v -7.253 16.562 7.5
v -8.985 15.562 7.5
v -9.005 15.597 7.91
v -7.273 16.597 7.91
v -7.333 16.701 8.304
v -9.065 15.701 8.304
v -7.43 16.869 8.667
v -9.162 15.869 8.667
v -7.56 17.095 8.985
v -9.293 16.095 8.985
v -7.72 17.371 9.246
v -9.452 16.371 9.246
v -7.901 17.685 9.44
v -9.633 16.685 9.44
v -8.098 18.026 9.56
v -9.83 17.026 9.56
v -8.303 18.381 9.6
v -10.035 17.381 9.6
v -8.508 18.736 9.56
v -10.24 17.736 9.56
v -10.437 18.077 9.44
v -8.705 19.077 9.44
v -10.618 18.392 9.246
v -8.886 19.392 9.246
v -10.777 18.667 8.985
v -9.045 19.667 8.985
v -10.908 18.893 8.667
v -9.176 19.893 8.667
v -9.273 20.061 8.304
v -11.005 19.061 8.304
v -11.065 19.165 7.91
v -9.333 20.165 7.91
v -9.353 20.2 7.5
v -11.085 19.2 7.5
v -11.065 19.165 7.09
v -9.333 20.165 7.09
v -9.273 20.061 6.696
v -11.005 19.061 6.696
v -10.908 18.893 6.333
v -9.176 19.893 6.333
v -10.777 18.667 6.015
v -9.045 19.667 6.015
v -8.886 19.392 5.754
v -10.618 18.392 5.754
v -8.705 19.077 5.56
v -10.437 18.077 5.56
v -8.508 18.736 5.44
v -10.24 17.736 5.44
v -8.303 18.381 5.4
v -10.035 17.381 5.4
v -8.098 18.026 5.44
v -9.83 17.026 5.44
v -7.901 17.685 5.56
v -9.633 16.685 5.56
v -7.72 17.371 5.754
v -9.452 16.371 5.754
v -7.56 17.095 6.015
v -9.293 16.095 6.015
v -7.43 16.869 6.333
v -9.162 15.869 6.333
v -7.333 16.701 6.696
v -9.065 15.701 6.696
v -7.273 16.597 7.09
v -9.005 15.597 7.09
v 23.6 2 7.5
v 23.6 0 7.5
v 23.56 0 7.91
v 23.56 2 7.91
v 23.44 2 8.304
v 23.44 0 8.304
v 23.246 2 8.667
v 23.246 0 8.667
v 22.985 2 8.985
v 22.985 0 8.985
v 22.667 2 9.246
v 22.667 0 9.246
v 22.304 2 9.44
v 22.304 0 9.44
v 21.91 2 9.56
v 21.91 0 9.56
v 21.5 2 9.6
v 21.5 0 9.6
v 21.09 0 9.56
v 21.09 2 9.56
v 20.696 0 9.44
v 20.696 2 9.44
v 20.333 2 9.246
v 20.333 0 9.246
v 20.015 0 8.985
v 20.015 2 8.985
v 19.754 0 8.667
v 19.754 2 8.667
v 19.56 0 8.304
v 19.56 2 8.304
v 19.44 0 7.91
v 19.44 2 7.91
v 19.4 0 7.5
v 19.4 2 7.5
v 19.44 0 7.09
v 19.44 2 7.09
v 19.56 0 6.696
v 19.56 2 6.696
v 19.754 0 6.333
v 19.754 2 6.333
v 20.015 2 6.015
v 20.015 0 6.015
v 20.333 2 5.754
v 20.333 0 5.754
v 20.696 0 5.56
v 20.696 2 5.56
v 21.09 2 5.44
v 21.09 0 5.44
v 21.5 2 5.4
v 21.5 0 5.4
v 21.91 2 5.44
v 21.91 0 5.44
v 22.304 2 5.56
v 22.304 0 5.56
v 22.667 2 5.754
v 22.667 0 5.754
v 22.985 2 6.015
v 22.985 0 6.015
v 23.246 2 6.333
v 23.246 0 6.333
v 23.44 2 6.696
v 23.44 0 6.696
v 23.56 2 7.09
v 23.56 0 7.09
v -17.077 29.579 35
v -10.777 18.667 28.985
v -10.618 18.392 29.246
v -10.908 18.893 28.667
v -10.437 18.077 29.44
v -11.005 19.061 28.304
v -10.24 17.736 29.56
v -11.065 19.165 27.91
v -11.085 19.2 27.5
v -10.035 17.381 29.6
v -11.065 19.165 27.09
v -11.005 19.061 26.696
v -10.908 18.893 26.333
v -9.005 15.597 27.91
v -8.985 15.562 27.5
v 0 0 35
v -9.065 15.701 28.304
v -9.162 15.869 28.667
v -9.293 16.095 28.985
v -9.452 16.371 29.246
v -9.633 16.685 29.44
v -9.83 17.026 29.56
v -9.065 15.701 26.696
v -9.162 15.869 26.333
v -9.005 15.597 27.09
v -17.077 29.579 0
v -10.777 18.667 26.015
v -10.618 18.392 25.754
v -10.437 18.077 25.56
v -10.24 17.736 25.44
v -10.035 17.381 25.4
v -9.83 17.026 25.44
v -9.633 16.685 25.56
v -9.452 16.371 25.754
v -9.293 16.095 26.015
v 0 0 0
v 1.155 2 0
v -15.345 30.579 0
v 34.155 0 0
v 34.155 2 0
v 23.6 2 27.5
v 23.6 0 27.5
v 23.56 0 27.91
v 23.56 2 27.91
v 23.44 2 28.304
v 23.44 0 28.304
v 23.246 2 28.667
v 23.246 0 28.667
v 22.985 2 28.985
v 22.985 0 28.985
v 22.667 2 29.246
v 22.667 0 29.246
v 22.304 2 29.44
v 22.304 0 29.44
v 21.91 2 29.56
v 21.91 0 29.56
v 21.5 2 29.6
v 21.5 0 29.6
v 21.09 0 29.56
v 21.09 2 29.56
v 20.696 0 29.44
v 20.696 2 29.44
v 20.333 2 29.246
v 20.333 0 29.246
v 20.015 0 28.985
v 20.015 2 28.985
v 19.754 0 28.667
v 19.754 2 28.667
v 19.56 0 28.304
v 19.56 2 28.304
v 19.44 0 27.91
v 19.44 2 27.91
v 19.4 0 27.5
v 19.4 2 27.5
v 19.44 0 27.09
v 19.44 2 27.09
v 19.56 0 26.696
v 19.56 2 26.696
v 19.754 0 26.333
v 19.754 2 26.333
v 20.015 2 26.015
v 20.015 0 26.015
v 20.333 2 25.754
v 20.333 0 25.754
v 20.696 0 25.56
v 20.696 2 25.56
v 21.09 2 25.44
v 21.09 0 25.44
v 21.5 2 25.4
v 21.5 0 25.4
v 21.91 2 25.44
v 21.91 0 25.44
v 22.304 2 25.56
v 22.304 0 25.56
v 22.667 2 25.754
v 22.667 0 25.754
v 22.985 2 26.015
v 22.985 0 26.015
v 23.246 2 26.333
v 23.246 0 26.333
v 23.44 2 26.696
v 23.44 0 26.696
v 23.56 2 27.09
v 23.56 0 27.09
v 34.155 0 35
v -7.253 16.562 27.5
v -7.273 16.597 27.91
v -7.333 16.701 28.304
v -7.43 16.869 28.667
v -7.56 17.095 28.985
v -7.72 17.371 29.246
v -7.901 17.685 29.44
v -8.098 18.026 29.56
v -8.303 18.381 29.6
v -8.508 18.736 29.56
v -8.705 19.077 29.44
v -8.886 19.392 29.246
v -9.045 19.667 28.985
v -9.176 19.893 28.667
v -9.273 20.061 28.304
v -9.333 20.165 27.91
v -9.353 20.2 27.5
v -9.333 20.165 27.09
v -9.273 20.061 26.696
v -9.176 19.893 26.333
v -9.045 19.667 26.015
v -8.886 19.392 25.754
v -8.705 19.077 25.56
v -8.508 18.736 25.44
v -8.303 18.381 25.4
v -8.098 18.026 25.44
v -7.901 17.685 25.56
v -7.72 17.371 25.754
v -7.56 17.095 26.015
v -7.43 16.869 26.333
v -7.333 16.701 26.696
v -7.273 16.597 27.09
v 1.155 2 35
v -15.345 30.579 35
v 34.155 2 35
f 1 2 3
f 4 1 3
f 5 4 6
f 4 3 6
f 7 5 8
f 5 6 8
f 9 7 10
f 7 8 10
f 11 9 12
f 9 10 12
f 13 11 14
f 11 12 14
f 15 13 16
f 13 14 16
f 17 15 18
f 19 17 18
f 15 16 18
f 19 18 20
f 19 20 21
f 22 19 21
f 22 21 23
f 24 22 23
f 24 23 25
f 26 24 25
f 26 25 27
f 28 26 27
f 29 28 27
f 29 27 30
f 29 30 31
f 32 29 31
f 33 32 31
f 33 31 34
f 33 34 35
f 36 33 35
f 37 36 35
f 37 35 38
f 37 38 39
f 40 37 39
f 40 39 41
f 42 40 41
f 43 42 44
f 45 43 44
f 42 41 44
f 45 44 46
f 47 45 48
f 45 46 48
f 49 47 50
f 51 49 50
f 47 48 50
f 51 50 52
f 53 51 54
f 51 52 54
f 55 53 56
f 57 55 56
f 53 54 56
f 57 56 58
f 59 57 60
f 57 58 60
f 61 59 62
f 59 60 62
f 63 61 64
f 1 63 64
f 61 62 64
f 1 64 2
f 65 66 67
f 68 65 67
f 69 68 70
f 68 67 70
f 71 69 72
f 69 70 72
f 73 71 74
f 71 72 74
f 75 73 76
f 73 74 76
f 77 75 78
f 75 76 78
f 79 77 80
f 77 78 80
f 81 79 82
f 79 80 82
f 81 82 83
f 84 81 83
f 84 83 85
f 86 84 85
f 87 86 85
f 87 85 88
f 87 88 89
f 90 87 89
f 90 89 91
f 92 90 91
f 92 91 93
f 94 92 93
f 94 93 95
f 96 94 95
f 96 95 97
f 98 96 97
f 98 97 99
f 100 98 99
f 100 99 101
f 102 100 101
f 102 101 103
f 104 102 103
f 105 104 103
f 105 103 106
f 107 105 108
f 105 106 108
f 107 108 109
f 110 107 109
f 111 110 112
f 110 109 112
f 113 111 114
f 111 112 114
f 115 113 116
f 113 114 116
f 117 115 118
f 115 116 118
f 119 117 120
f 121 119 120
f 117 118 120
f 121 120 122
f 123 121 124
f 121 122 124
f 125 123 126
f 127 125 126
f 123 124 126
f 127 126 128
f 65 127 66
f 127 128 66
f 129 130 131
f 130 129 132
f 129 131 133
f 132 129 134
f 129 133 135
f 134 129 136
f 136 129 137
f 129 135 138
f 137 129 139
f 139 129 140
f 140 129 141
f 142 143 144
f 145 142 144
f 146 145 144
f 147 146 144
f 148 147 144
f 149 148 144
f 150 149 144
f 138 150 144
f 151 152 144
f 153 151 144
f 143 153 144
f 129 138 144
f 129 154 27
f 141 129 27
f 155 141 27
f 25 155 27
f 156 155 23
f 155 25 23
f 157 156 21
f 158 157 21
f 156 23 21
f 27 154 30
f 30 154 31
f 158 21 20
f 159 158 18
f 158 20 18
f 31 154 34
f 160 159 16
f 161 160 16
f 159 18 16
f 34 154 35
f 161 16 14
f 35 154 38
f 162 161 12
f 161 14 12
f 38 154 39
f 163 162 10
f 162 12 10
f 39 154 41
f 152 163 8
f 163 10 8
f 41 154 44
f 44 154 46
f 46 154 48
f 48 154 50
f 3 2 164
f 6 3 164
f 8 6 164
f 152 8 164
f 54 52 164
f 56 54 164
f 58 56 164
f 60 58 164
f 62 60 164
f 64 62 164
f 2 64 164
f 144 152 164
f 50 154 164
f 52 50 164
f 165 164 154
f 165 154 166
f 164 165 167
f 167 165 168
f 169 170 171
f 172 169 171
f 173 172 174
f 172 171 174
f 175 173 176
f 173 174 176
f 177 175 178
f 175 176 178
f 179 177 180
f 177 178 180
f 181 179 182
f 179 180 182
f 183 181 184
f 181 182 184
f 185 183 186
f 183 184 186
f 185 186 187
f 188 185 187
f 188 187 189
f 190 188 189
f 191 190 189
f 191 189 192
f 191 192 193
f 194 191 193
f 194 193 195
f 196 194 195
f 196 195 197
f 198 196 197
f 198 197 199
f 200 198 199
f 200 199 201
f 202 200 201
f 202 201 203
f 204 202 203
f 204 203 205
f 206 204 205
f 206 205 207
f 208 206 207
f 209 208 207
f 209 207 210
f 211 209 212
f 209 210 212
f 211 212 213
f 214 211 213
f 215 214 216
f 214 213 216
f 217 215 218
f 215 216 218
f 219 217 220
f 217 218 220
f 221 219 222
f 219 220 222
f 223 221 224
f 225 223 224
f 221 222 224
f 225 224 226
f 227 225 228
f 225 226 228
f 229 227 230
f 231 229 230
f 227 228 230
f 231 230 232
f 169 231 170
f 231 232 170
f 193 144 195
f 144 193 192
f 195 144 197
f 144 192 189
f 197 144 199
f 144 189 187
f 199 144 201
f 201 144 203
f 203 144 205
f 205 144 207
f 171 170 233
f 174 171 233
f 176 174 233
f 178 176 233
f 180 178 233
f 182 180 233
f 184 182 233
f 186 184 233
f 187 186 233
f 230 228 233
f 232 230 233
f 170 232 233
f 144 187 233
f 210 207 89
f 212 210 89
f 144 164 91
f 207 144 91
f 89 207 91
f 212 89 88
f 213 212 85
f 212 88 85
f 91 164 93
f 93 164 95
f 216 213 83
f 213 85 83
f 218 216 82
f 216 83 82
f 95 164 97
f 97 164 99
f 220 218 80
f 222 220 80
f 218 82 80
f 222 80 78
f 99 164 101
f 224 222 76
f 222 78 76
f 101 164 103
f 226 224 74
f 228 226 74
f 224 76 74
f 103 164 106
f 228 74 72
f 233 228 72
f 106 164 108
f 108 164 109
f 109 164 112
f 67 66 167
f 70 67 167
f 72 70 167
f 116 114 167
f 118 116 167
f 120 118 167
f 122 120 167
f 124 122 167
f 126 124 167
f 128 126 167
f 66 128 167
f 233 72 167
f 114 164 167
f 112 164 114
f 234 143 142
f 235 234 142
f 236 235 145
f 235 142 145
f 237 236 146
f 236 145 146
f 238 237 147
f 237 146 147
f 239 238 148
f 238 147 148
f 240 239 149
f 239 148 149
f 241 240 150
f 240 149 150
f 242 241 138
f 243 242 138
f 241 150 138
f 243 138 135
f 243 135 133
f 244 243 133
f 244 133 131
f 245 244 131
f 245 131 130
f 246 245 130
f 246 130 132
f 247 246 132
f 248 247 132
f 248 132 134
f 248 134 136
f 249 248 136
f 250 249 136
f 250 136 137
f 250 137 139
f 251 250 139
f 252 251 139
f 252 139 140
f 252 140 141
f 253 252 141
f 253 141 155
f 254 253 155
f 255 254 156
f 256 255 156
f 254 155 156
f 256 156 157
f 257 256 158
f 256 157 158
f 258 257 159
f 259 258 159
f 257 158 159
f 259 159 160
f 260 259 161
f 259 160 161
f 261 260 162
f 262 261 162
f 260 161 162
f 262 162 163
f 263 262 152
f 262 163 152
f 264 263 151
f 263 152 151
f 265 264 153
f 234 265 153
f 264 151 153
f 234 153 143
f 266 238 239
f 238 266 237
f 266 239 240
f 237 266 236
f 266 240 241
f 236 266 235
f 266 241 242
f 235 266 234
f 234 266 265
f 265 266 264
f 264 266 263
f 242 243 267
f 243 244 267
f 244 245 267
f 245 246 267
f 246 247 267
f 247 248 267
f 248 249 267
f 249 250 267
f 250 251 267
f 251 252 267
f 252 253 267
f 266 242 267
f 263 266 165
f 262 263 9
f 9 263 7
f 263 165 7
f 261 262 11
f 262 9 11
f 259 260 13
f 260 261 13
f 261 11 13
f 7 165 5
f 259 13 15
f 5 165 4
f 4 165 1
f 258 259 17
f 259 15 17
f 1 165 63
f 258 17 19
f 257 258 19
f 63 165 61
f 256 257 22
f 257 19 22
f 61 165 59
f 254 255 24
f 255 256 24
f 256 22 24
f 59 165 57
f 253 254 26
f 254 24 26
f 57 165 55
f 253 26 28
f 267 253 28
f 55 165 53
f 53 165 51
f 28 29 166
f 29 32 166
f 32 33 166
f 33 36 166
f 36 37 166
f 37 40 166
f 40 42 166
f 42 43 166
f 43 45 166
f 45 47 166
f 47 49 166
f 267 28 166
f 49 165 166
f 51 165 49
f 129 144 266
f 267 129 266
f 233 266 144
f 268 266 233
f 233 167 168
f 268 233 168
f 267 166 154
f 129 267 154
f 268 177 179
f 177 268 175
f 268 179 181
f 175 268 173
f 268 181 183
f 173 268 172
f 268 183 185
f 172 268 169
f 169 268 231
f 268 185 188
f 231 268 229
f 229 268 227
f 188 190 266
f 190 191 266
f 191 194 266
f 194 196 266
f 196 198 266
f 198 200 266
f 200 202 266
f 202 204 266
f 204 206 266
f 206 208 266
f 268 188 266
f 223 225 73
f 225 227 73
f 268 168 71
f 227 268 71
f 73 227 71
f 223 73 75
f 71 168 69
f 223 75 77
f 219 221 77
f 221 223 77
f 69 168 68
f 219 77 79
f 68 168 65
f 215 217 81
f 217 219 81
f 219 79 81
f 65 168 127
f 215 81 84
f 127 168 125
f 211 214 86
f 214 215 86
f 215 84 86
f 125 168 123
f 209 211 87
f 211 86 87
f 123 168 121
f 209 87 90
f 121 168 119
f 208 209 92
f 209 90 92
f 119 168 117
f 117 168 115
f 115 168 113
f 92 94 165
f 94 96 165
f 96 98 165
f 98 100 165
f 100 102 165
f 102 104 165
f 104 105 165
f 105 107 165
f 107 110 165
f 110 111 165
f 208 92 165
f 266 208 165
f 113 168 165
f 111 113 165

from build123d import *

# Parameters (mm, degrees)
EXTRUDE_3_DEPTH     = 35
SKETCH_3_R          = 2.1
CUT_EXTRUDE_1_DEPTH = 58.676762411
SKETCH_4_R          = 2.1
CUT_EXTRUDE_2_DEPTH = 58.676762411


with BuildPart() as part:
    # 草图1 → 凸台-拉伸3 (new body)
    with BuildSketch(Plane.XY):
        Polygon((0, 0), (34.154700538, 0), (34.154700538, 2), (1.154700538, 2), (-15.345299462, 30.578838325), (-17.077350269, 29.578838325), align=None)
    extrude(amount=EXTRUDE_3_DEPTH)

    # 草图3 → 切除-拉伸1 (cut, through all)
    with BuildSketch(Plane.XZ):
        with Locations((21.5, 27.5)):
            Circle(SKETCH_3_R)
        with Locations((21.5, 7.5)):
            Circle(SKETCH_3_R)
    extrude(amount=-CUT_EXTRUDE_1_DEPTH, mode=Mode.SUBTRACT)

    # 草图4 → 切除-拉伸2 (cut, through all)
    with BuildSketch(Plane(origin=(0, 0, 0), x_dir=(0, 0, 1), z_dir=(-0.8660254037844397, -0.499999999999998, 0))):
        with Locations(Location((27.5, 20.07, 0), (0, 0, 270))):
            Circle(SKETCH_4_R)
        with Locations(Location((7.5, 20.07, 0), (0, 0, 270))):
            Circle(SKETCH_4_R)
    extrude(amount=-CUT_EXTRUDE_2_DEPTH, mode=Mode.SUBTRACT)


solid = part.part
